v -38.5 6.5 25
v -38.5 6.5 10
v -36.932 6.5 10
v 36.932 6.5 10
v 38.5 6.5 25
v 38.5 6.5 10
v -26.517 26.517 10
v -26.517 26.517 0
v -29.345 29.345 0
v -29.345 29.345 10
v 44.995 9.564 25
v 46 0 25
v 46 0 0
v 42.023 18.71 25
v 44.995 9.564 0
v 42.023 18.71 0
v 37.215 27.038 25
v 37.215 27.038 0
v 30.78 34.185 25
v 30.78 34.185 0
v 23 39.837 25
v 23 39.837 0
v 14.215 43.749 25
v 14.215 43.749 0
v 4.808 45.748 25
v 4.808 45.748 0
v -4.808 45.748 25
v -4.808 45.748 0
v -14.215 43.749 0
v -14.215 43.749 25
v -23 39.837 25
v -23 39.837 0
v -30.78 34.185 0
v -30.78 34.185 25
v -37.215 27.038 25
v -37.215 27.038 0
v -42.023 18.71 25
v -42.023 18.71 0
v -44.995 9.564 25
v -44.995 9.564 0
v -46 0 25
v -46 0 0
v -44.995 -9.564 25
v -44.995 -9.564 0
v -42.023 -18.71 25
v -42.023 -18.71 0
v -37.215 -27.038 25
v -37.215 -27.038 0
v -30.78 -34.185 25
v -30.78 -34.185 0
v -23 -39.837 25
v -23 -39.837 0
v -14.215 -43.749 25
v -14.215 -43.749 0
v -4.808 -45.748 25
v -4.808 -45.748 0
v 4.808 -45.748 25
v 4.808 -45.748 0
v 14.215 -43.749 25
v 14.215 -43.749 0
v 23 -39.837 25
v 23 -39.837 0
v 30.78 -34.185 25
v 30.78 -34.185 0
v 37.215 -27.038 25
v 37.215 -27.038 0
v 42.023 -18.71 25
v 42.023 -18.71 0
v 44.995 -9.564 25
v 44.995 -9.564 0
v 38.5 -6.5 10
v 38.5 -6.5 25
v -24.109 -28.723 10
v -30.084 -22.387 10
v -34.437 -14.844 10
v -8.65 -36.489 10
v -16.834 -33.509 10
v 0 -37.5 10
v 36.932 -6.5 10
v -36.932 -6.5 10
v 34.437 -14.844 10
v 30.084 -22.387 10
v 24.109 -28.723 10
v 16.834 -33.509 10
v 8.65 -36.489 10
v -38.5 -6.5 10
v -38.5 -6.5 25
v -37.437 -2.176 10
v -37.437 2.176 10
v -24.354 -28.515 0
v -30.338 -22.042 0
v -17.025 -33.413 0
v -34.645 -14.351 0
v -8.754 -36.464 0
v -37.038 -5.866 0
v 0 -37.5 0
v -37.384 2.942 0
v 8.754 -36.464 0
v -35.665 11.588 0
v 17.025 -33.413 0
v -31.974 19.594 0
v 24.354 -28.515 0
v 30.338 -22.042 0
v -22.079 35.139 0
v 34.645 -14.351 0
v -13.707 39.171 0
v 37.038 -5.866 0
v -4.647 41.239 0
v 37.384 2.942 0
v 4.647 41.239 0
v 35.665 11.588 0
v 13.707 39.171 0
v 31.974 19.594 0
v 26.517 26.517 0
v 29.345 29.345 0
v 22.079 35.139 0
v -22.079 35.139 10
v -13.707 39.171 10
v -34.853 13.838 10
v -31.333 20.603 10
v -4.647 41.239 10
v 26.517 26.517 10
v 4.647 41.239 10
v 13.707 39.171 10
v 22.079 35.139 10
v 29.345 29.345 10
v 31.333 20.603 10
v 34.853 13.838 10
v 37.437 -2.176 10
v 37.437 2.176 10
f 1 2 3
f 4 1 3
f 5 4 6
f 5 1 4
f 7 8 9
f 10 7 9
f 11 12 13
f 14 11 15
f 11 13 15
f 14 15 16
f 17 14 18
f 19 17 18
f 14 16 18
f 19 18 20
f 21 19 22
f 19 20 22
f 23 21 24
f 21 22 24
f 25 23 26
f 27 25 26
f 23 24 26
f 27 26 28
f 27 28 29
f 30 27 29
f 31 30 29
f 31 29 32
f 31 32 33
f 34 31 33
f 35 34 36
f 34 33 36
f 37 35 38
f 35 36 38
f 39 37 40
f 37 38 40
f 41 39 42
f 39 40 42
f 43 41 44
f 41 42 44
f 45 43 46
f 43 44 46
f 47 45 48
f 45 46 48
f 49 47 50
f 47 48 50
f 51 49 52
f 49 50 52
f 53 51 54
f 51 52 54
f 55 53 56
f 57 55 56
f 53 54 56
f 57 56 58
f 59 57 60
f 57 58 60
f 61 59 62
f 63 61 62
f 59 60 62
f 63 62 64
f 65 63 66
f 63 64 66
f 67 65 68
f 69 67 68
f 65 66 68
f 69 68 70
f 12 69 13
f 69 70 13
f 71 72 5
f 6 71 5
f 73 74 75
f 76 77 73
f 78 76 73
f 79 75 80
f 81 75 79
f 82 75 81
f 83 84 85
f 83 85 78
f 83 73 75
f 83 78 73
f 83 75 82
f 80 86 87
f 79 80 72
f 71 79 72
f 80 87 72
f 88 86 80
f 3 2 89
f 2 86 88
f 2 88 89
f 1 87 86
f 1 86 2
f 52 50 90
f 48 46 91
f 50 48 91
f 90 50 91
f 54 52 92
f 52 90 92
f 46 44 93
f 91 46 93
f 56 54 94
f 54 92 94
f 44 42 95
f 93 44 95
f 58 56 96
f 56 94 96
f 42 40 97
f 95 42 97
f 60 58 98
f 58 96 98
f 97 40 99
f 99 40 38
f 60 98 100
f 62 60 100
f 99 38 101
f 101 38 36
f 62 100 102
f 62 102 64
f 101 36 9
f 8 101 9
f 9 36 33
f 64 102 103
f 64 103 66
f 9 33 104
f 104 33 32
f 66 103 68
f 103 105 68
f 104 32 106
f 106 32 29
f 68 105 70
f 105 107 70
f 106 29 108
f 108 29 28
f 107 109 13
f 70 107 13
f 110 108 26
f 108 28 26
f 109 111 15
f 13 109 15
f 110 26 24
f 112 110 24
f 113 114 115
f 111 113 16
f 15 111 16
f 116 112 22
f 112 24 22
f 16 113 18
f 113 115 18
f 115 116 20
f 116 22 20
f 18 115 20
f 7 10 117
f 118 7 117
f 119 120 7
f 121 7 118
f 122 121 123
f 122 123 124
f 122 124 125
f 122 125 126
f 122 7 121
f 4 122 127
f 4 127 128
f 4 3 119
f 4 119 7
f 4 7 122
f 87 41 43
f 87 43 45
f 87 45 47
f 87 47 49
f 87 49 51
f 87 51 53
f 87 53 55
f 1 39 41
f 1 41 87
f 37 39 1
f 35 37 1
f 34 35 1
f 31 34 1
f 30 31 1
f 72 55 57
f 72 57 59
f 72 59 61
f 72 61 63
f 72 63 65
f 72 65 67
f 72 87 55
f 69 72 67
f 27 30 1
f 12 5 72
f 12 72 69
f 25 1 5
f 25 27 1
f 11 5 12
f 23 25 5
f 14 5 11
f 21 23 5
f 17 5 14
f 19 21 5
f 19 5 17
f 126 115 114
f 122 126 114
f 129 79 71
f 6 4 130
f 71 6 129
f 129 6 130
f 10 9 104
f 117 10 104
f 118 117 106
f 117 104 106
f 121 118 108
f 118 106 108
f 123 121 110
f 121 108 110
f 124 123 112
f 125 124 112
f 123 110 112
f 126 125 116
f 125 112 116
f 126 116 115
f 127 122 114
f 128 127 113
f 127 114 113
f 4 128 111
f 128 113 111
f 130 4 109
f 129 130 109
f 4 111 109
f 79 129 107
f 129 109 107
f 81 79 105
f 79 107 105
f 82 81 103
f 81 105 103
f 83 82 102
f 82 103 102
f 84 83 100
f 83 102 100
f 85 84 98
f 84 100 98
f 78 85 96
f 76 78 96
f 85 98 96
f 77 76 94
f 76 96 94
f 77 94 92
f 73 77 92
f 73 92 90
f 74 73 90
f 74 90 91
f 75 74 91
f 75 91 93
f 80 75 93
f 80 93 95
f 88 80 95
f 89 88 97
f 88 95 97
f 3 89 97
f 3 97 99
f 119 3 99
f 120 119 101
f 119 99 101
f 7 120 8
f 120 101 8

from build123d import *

# Parameters (mm, degrees)
F0_R     = 46
F1_DEPTH = 25
F3_DEPTH = 10
F4_W     = 77
F4_H     = 13
F5_DEPTH = 15


with BuildPart() as f1:
    # F0 (on Top) → F1 (new body)
    with BuildSketch(Plane.XY):
        Circle(F0_R)
    extrude(amount=F1_DEPTH)

    # F2 (on face) → F3 (cut)
    with BuildSketch(Plane(origin=(0, 0, 0), x_dir=(1, 0, 0), z_dir=(0, 0, -1))):
        with BuildLine():
            Line((29.344931, -29.344931), (26.516504, -26.516504))
            ThreePointArc((26.516504, -26.516504), (0, 37.5), (-26.516504, -26.516504))
            Line((-26.516504, -26.516504), (-29.344931, -29.344931))
            ThreePointArc((-29.344931, -29.344931), (0, -41.5), (29.344931, -29.344931))
        make_face()
    extrude(amount=-F3_DEPTH, mode=Mode.SUBTRACT)

    # F4 (on face) → F5 (cut)
    with BuildSketch(Plane.XY.offset(25)):
        Rectangle(F4_W, F4_H)
    extrude(amount=-F5_DEPTH, mode=Mode.SUBTRACT)


solid = f1.part
